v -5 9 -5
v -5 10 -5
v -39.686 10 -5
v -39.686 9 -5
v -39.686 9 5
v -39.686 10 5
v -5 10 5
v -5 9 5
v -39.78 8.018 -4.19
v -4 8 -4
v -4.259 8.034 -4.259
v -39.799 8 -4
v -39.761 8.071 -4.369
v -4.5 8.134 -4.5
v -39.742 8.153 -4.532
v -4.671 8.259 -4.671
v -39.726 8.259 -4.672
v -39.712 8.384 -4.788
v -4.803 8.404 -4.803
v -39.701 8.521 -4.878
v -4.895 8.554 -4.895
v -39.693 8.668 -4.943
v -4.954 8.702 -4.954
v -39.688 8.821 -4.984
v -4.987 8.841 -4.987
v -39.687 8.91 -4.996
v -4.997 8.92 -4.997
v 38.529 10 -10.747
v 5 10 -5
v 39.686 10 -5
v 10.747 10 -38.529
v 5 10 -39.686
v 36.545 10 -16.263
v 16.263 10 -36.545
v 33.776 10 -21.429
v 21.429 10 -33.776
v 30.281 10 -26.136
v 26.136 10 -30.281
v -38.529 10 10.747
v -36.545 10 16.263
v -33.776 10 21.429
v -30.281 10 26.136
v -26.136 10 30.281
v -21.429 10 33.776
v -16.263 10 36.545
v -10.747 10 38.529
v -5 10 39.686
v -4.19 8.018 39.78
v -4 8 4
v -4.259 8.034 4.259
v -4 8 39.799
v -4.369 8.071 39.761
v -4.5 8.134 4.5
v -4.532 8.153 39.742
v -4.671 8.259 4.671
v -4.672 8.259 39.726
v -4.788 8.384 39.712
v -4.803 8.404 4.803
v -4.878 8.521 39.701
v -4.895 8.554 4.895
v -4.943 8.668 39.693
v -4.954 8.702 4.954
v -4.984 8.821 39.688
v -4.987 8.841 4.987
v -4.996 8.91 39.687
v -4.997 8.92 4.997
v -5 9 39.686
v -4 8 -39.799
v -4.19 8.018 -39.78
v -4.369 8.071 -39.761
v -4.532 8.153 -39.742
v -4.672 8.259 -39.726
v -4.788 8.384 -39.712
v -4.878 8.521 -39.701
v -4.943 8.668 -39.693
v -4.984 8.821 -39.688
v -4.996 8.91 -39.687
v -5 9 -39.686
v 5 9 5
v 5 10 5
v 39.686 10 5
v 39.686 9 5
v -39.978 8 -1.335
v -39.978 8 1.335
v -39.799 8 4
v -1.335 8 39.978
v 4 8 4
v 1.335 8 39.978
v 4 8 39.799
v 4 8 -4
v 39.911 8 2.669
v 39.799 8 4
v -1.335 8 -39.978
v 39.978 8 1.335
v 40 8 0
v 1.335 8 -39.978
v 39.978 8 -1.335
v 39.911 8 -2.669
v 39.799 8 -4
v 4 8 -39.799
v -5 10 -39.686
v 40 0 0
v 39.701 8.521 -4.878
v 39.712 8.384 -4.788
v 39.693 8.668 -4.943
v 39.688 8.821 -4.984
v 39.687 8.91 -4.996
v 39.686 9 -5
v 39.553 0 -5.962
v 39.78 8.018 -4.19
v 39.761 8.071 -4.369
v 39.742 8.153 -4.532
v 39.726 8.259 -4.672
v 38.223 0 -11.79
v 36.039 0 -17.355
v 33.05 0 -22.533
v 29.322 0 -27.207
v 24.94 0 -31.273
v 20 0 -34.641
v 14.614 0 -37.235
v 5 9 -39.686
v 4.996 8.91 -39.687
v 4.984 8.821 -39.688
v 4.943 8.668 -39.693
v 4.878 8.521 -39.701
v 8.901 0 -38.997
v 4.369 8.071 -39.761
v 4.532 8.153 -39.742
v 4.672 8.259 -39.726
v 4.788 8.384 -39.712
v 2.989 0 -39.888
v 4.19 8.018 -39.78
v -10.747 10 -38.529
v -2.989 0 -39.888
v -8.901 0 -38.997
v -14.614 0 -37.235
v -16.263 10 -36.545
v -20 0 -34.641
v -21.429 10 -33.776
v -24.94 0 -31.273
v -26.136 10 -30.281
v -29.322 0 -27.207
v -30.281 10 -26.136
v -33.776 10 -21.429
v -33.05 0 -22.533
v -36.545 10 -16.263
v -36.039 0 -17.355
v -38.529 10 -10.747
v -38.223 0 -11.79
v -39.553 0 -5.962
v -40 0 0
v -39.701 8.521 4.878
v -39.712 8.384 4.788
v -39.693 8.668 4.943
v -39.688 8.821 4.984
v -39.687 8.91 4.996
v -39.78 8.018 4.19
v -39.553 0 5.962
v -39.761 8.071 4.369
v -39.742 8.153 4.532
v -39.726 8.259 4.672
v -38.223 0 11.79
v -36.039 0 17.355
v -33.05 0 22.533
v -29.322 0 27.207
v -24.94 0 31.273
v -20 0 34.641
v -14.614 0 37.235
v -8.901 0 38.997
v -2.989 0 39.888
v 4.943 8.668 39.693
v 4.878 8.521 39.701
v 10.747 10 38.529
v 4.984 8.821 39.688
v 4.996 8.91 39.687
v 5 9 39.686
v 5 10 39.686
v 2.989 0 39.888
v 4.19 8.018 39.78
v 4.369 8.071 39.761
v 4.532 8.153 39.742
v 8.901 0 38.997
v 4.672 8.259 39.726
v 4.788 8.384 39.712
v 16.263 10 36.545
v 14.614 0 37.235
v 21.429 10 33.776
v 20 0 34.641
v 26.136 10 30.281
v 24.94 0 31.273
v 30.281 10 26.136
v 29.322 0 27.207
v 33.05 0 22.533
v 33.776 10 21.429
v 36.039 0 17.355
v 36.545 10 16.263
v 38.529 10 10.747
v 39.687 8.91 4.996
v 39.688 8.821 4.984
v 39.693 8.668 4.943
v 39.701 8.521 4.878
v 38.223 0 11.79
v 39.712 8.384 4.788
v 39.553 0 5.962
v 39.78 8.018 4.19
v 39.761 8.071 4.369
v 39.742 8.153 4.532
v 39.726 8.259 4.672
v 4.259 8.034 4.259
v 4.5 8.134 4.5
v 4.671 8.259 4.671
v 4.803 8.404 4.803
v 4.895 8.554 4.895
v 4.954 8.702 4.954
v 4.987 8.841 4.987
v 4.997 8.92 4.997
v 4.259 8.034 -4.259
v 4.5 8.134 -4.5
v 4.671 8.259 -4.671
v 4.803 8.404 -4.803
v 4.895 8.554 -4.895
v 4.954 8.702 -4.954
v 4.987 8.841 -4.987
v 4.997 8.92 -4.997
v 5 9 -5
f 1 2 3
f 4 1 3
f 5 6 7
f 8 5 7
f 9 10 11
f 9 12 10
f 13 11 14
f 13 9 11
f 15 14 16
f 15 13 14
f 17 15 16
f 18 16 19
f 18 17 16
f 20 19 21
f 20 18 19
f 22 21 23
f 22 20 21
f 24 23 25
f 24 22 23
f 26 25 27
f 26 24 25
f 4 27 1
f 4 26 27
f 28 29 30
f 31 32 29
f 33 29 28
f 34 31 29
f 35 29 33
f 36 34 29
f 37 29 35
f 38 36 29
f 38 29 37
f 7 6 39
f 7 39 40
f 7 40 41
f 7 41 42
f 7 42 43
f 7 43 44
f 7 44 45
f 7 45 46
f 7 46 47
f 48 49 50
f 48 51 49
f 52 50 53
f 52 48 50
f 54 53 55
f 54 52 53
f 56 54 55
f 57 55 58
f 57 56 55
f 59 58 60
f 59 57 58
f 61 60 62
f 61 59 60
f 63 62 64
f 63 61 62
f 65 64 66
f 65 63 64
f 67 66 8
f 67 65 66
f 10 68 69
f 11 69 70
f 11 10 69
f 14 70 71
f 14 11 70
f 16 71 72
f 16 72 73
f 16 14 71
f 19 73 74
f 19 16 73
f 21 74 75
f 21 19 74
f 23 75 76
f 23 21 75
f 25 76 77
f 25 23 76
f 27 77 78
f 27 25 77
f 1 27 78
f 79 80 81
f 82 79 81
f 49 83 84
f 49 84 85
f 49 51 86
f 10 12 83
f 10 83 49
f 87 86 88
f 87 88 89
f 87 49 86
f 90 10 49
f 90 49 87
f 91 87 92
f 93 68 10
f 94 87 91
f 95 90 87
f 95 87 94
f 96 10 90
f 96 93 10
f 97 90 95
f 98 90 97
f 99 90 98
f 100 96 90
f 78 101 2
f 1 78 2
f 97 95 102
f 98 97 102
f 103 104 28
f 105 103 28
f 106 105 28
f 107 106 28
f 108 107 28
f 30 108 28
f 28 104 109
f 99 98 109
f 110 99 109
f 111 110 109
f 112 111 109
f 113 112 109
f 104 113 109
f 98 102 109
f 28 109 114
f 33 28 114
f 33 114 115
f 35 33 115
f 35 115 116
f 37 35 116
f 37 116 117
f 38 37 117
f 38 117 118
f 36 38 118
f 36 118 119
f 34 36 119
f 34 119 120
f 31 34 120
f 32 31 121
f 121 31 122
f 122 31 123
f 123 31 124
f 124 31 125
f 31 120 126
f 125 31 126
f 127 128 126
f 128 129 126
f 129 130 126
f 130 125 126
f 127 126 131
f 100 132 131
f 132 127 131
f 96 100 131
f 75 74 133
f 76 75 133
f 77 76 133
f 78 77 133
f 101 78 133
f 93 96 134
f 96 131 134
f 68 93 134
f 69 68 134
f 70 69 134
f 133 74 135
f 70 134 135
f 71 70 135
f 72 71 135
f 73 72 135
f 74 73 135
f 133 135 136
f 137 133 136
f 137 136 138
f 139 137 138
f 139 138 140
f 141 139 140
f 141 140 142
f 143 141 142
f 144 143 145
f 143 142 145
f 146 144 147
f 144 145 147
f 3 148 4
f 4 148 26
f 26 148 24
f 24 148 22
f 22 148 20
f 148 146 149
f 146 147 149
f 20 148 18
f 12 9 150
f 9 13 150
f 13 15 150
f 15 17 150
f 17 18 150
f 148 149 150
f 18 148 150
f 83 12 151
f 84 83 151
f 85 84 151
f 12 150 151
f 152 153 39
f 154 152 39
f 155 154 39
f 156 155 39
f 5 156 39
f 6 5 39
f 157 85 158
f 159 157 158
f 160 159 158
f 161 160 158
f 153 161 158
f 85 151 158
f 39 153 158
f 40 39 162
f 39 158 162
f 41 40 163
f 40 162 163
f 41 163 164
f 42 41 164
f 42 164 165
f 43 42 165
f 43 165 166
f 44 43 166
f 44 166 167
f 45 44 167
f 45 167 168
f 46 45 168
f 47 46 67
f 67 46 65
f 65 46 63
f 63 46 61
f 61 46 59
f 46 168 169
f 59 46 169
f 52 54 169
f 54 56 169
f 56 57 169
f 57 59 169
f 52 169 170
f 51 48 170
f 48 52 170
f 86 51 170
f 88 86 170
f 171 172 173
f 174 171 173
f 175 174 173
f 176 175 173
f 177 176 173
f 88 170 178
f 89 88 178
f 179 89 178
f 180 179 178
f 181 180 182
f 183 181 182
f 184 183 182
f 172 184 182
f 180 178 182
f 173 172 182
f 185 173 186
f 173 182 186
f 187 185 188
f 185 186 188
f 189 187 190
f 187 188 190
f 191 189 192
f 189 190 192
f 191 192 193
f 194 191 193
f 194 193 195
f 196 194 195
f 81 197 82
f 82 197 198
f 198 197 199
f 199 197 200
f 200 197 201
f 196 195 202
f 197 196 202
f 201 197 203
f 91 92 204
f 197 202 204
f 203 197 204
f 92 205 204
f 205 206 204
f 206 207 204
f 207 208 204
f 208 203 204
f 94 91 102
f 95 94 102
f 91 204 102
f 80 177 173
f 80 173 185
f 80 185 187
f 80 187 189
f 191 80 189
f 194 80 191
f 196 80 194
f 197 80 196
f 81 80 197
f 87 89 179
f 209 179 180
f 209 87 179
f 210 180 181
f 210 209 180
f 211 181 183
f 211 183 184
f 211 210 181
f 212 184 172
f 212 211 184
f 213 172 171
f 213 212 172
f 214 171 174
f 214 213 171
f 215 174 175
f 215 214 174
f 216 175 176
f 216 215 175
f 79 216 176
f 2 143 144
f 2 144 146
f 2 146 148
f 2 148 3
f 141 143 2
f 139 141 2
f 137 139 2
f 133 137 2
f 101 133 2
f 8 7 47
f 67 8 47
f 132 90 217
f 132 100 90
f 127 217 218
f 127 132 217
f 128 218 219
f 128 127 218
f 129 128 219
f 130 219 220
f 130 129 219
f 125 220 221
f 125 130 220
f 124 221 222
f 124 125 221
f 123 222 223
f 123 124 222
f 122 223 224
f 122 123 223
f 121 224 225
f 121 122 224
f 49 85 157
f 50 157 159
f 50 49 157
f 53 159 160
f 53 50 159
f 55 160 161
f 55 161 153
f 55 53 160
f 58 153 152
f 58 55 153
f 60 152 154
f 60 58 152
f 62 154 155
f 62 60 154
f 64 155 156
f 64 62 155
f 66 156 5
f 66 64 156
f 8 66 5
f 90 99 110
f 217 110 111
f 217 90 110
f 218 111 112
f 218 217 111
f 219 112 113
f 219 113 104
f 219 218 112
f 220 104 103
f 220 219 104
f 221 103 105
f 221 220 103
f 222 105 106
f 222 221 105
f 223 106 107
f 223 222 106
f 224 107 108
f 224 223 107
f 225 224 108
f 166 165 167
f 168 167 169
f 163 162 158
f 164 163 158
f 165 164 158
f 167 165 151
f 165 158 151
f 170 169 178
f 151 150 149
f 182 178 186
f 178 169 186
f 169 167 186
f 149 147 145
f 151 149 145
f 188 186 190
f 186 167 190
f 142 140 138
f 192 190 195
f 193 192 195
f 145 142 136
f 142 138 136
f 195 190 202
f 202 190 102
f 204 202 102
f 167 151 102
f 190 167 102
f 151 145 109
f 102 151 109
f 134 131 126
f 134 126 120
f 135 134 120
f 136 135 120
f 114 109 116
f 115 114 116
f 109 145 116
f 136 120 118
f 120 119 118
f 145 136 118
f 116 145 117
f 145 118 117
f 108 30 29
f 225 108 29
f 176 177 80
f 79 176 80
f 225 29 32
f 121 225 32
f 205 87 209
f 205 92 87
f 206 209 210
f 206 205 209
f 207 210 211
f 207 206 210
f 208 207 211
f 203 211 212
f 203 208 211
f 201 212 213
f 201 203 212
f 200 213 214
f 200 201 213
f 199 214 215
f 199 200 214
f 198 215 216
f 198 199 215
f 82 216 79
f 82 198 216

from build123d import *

# Parameters (mm, degrees)
SKETCH1_R           = 40
BOSS_EXTRUDE1_DEPTH = 10
CUT_EXTRUDE2_DEPTH  = 2
FILLET1_R           = 1


with BuildPart() as part:
    # Sketch1 → Boss-Extrude1 (new body)
    with BuildSketch(Plane(origin=(0, 0, 0), x_dir=(1, 0, 0), z_dir=(0, 1, 0))):
        Circle(SKETCH1_R)
    extrude(amount=BOSS_EXTRUDE1_DEPTH)

    # Sketch7 → Cut-Extrude2 (cut)
    with BuildSketch(Plane(origin=(0, 10, 0), x_dir=(1, 0, 0), z_dir=(0, 1, 0))):
        with BuildLine():
            Line((-5, 39.686269666), (-5, 5))
            Line((-5, 5), (-39.686269666, 5))
            ThreePointArc((-39.686269666, 5), (-40, 0), (-39.686269666, -5))
            Line((-39.686269666, -5), (-5, -5))
            Line((-5, -5), (-5, -39.686269666))
            ThreePointArc((-5, -39.686269666), (0, -40), (5, -39.686269666))
            Line((5, -39.686269666), (5, -5))
            Line((5, -5), (39.686269666, -5))
            ThreePointArc((39.686269666, -5), (40, 0), (39.686269666, 5))
            Line((39.686269666, 5), (5, 5))
            Line((5, 5), (5, 39.686269666))
            ThreePointArc((5, 39.686269666), (0, 40), (-5, 39.686269666))
        make_face()
    extrude(amount=-CUT_EXTRUDE2_DEPTH, mode=Mode.SUBTRACT)

    # Fillet1
    fillet1_edges = [part.edges().sort_by_distance(p)[0] for p in [
        (5, 8, -22.343134833),
        (22.343134833, 8, -5),
        (22.343134833, 8, 5),
        (5, 8, 22.343134833),
        (-5, 8, 22.343134833),
        (-22.343134833, 8, 5),
        (-22.343134833, 8, -5),
        (-5, 8, -22.343134833),
    ]]
    fillet(fillet1_edges, radius=FILLET1_R)


solid = part.part
